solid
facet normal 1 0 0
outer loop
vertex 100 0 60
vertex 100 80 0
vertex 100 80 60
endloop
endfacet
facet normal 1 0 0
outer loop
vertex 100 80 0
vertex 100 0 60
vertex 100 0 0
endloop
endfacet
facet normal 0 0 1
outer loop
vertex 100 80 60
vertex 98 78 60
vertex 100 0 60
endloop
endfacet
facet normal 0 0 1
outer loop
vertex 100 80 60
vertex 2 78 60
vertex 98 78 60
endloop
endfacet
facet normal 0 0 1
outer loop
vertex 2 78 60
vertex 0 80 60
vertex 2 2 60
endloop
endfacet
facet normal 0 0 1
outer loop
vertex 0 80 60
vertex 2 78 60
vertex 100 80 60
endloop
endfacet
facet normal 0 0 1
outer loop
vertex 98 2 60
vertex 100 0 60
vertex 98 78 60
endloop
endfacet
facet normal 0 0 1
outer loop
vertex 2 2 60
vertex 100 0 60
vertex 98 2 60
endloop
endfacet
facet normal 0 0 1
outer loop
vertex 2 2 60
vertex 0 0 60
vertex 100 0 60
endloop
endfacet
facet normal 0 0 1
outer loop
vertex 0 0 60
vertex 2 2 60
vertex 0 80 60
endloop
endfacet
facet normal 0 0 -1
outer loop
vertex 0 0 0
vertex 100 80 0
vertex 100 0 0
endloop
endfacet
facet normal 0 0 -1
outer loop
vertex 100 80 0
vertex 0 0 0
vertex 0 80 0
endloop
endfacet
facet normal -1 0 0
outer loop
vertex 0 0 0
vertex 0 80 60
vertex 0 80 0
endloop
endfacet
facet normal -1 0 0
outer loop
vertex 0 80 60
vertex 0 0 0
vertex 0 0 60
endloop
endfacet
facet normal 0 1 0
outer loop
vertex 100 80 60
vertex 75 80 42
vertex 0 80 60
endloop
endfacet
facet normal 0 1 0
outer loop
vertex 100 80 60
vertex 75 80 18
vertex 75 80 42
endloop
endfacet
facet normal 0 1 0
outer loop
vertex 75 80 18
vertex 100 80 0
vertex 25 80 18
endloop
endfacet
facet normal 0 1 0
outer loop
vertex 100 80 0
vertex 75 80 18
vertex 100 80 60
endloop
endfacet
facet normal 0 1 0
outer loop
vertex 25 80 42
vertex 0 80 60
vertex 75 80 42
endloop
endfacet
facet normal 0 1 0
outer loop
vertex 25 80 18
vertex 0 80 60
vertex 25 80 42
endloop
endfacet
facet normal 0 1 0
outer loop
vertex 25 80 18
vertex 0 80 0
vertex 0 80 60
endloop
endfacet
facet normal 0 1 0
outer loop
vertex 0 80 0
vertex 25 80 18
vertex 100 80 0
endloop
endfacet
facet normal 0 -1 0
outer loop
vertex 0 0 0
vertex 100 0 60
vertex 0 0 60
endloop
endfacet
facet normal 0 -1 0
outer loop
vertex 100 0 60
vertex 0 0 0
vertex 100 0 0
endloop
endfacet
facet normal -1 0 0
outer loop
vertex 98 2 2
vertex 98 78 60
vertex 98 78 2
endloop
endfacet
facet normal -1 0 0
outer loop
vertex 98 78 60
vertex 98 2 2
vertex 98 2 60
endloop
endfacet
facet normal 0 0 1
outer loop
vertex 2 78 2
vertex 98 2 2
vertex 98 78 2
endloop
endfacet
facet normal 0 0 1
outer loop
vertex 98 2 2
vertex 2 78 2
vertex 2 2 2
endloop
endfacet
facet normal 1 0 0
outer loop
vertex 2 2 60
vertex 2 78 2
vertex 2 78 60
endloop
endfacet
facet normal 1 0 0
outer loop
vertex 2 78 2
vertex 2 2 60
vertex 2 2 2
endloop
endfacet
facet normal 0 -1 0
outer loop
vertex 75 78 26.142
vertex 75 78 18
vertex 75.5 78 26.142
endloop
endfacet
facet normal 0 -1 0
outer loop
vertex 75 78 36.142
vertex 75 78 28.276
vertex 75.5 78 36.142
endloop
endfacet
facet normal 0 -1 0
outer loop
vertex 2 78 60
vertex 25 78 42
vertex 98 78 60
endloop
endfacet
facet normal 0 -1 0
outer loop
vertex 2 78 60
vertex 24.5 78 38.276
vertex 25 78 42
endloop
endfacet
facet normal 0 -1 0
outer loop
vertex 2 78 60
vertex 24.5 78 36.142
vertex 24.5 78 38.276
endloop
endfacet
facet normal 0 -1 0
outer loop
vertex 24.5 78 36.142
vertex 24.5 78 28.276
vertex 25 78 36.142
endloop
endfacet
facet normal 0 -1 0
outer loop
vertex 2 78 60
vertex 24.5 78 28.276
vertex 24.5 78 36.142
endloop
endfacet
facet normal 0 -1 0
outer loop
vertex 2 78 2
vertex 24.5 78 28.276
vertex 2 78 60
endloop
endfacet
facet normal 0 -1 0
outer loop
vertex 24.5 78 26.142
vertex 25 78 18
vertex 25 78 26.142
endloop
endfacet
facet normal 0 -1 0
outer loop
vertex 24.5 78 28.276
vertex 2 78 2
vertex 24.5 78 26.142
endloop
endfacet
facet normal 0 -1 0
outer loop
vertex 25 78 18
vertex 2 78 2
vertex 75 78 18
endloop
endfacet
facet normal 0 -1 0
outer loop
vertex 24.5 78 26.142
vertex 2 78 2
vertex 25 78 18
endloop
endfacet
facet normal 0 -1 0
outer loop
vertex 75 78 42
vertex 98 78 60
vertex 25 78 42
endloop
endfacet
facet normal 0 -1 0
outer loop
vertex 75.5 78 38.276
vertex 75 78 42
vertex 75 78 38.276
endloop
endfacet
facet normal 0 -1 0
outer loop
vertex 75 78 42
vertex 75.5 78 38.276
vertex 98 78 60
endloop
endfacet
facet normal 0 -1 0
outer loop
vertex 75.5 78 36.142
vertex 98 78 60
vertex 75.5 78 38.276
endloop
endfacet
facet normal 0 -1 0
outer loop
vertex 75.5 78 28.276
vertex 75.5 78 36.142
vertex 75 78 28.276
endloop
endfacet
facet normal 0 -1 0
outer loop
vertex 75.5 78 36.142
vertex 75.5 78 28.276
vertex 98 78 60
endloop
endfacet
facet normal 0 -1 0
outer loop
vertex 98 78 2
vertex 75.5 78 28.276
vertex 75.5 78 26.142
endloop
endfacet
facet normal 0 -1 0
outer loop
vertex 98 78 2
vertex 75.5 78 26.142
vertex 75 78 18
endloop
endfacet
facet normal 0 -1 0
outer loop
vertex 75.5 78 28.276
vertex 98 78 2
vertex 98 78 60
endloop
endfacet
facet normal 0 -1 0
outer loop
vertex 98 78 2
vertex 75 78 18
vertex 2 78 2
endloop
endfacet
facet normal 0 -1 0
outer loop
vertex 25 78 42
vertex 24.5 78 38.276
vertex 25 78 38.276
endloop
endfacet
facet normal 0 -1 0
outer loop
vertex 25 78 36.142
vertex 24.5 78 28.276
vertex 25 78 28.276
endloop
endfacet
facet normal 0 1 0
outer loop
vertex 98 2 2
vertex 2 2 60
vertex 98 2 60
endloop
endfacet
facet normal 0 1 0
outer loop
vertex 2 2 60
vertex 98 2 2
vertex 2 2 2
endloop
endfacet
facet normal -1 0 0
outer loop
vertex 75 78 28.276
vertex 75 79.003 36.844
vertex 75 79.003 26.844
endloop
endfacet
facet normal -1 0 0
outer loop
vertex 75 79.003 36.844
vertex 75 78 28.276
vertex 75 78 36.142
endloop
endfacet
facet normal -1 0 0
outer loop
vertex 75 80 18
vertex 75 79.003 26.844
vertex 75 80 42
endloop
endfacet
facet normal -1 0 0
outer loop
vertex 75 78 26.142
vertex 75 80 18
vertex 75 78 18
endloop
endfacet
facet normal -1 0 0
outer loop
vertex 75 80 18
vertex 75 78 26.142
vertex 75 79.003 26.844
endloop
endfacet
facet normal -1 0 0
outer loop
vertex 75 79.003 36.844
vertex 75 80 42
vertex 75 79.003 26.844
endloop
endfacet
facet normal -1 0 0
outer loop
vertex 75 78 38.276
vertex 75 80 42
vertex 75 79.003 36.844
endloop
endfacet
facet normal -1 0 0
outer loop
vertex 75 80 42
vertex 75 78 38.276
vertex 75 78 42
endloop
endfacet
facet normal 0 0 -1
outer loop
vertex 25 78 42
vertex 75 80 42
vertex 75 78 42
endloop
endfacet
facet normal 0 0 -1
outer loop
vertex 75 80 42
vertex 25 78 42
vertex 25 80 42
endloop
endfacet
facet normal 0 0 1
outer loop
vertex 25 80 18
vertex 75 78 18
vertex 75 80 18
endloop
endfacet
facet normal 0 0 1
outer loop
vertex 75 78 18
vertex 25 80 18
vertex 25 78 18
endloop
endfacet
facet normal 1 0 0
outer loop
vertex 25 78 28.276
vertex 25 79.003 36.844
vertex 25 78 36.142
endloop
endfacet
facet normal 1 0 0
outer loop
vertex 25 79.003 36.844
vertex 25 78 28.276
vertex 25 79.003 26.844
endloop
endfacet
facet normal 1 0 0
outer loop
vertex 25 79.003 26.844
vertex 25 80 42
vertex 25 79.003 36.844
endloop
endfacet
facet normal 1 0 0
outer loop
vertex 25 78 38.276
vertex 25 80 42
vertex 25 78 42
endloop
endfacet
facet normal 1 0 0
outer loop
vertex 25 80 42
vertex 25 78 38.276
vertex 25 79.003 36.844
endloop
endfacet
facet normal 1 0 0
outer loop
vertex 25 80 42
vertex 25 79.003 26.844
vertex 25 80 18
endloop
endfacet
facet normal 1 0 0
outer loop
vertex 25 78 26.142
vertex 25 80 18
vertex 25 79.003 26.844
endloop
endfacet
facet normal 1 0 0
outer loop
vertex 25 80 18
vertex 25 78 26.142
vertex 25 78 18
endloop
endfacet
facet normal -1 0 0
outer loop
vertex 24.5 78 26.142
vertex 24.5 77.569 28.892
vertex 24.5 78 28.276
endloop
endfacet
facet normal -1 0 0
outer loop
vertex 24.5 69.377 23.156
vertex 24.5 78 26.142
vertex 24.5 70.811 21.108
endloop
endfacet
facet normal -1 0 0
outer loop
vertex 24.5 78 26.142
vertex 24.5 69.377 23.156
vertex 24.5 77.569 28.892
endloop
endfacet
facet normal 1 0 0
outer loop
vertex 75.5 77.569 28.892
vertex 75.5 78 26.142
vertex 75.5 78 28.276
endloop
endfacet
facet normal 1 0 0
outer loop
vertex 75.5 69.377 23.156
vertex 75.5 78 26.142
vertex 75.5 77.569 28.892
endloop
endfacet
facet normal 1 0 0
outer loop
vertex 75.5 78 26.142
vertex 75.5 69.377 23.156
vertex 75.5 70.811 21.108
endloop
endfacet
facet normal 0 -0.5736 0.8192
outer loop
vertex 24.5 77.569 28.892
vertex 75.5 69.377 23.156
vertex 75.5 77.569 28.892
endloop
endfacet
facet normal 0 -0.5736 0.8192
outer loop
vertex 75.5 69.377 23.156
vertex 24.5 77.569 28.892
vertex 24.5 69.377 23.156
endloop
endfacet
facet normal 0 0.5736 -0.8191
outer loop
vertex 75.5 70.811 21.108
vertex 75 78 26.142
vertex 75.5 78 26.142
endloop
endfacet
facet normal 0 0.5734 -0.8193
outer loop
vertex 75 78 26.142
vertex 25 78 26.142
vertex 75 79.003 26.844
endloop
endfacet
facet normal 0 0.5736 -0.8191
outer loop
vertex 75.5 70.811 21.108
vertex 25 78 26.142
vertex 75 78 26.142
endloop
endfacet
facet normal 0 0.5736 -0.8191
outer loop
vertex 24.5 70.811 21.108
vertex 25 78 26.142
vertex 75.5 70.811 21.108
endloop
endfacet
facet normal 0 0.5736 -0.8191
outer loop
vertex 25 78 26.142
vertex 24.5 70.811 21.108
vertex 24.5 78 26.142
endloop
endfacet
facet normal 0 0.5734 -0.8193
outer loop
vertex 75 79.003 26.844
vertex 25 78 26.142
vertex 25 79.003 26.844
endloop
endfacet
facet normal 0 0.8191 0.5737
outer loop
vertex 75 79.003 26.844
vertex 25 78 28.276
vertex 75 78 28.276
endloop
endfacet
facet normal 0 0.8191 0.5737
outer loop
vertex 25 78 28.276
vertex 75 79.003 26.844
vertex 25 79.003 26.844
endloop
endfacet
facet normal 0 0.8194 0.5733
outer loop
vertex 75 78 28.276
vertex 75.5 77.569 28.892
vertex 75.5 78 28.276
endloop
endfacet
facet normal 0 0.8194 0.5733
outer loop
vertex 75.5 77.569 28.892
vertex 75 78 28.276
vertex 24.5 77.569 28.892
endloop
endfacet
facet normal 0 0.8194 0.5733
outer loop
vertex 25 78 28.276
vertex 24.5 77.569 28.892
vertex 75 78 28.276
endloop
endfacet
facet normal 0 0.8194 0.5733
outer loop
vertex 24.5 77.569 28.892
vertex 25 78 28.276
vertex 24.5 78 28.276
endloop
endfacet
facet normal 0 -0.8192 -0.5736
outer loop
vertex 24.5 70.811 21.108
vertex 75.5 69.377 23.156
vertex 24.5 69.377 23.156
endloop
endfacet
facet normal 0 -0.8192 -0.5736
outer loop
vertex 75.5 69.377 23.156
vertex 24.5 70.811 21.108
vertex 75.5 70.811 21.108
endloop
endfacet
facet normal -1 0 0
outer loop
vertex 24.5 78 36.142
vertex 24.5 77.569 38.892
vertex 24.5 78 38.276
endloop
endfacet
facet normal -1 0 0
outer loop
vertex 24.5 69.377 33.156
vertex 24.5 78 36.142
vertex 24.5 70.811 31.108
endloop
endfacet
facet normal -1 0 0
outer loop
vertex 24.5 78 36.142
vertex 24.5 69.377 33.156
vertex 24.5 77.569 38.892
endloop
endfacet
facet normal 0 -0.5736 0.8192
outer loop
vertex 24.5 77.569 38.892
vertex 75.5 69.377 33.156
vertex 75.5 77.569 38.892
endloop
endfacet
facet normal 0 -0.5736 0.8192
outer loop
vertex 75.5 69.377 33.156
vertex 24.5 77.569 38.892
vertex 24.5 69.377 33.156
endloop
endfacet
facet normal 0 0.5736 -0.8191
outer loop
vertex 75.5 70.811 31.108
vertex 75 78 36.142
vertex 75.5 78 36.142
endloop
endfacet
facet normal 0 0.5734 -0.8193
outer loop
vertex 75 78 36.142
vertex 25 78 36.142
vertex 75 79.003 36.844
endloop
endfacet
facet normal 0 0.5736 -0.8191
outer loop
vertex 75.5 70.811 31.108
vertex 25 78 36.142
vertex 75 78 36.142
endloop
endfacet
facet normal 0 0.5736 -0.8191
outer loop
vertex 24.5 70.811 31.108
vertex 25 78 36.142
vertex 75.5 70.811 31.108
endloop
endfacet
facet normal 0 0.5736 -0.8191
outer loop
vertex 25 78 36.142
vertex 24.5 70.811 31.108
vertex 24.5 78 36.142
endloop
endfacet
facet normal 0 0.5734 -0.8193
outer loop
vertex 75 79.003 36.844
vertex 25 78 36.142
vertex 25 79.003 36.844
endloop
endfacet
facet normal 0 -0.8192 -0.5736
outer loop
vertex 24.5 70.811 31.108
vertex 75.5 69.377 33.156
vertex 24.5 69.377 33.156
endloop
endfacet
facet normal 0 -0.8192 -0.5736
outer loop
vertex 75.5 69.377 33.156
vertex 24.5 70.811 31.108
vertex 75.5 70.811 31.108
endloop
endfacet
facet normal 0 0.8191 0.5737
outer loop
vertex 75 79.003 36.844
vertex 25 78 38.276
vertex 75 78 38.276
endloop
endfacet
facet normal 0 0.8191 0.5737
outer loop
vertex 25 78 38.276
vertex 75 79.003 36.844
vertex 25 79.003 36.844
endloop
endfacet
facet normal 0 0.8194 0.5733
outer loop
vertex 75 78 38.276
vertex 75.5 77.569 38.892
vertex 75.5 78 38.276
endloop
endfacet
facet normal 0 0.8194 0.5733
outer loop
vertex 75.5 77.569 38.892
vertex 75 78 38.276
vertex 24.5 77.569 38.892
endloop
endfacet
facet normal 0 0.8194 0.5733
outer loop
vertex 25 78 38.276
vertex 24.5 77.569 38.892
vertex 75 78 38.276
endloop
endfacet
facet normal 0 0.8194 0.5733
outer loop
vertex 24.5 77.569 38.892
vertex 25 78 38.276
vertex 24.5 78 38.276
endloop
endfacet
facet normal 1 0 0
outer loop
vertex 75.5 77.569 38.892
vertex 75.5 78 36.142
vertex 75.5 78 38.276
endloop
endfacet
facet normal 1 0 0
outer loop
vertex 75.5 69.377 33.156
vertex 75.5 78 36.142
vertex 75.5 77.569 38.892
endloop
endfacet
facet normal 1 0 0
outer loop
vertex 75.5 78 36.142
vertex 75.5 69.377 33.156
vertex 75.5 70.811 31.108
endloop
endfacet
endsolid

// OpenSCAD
$fn = 32;

// ----------------------------------------------------------------------
// Vent box: louvers enclosure
// ----------------------------------------------------------------------

// --- parameters (mm) ---
box_l = 100;              // box length, X
box_w = 80;               // box width, Y
box_h = 60;               // box height, Z
wall_t = 2;               // shell wall thickness
win_l = 50;               // vent window width, X
win_h = 24;               // vent window height, Z
slat_t = 2.5;             // louver slat thickness
slat_d = 10;              // louver slat depth
slat_a = 35;              // louver slat angle, degrees
slat_pitch = 10;          // louver pitch
slat_yc = 74.19;          // slat centreline Y

win_z0 = (box_h - win_h) / 2;  // window lower edge Z
n_slats = 2;  // louver count
slat_z0 = win_z0 + (win_h - (n_slats - 1) * slat_pitch) / 2;

difference() {
  union() {
    difference() {
      cube([box_l, box_w, box_h]);
  translate([wall_t, wall_t, wall_t])
    cube([box_l - 2 * wall_t, box_w - 2 * wall_t, box_h]);
  translate([(box_l - win_l) / 2, box_w - wall_t - 1, win_z0])
    cube([win_l, wall_t + 2, win_h]);
    }
    for (i = [0 : n_slats - 1])
      translate([box_l / 2, slat_yc, slat_z0 + i * slat_pitch])
        rotate([slat_a, 0, 0])
          cube([win_l + 1, slat_d, slat_t], center = true);
  }
}
